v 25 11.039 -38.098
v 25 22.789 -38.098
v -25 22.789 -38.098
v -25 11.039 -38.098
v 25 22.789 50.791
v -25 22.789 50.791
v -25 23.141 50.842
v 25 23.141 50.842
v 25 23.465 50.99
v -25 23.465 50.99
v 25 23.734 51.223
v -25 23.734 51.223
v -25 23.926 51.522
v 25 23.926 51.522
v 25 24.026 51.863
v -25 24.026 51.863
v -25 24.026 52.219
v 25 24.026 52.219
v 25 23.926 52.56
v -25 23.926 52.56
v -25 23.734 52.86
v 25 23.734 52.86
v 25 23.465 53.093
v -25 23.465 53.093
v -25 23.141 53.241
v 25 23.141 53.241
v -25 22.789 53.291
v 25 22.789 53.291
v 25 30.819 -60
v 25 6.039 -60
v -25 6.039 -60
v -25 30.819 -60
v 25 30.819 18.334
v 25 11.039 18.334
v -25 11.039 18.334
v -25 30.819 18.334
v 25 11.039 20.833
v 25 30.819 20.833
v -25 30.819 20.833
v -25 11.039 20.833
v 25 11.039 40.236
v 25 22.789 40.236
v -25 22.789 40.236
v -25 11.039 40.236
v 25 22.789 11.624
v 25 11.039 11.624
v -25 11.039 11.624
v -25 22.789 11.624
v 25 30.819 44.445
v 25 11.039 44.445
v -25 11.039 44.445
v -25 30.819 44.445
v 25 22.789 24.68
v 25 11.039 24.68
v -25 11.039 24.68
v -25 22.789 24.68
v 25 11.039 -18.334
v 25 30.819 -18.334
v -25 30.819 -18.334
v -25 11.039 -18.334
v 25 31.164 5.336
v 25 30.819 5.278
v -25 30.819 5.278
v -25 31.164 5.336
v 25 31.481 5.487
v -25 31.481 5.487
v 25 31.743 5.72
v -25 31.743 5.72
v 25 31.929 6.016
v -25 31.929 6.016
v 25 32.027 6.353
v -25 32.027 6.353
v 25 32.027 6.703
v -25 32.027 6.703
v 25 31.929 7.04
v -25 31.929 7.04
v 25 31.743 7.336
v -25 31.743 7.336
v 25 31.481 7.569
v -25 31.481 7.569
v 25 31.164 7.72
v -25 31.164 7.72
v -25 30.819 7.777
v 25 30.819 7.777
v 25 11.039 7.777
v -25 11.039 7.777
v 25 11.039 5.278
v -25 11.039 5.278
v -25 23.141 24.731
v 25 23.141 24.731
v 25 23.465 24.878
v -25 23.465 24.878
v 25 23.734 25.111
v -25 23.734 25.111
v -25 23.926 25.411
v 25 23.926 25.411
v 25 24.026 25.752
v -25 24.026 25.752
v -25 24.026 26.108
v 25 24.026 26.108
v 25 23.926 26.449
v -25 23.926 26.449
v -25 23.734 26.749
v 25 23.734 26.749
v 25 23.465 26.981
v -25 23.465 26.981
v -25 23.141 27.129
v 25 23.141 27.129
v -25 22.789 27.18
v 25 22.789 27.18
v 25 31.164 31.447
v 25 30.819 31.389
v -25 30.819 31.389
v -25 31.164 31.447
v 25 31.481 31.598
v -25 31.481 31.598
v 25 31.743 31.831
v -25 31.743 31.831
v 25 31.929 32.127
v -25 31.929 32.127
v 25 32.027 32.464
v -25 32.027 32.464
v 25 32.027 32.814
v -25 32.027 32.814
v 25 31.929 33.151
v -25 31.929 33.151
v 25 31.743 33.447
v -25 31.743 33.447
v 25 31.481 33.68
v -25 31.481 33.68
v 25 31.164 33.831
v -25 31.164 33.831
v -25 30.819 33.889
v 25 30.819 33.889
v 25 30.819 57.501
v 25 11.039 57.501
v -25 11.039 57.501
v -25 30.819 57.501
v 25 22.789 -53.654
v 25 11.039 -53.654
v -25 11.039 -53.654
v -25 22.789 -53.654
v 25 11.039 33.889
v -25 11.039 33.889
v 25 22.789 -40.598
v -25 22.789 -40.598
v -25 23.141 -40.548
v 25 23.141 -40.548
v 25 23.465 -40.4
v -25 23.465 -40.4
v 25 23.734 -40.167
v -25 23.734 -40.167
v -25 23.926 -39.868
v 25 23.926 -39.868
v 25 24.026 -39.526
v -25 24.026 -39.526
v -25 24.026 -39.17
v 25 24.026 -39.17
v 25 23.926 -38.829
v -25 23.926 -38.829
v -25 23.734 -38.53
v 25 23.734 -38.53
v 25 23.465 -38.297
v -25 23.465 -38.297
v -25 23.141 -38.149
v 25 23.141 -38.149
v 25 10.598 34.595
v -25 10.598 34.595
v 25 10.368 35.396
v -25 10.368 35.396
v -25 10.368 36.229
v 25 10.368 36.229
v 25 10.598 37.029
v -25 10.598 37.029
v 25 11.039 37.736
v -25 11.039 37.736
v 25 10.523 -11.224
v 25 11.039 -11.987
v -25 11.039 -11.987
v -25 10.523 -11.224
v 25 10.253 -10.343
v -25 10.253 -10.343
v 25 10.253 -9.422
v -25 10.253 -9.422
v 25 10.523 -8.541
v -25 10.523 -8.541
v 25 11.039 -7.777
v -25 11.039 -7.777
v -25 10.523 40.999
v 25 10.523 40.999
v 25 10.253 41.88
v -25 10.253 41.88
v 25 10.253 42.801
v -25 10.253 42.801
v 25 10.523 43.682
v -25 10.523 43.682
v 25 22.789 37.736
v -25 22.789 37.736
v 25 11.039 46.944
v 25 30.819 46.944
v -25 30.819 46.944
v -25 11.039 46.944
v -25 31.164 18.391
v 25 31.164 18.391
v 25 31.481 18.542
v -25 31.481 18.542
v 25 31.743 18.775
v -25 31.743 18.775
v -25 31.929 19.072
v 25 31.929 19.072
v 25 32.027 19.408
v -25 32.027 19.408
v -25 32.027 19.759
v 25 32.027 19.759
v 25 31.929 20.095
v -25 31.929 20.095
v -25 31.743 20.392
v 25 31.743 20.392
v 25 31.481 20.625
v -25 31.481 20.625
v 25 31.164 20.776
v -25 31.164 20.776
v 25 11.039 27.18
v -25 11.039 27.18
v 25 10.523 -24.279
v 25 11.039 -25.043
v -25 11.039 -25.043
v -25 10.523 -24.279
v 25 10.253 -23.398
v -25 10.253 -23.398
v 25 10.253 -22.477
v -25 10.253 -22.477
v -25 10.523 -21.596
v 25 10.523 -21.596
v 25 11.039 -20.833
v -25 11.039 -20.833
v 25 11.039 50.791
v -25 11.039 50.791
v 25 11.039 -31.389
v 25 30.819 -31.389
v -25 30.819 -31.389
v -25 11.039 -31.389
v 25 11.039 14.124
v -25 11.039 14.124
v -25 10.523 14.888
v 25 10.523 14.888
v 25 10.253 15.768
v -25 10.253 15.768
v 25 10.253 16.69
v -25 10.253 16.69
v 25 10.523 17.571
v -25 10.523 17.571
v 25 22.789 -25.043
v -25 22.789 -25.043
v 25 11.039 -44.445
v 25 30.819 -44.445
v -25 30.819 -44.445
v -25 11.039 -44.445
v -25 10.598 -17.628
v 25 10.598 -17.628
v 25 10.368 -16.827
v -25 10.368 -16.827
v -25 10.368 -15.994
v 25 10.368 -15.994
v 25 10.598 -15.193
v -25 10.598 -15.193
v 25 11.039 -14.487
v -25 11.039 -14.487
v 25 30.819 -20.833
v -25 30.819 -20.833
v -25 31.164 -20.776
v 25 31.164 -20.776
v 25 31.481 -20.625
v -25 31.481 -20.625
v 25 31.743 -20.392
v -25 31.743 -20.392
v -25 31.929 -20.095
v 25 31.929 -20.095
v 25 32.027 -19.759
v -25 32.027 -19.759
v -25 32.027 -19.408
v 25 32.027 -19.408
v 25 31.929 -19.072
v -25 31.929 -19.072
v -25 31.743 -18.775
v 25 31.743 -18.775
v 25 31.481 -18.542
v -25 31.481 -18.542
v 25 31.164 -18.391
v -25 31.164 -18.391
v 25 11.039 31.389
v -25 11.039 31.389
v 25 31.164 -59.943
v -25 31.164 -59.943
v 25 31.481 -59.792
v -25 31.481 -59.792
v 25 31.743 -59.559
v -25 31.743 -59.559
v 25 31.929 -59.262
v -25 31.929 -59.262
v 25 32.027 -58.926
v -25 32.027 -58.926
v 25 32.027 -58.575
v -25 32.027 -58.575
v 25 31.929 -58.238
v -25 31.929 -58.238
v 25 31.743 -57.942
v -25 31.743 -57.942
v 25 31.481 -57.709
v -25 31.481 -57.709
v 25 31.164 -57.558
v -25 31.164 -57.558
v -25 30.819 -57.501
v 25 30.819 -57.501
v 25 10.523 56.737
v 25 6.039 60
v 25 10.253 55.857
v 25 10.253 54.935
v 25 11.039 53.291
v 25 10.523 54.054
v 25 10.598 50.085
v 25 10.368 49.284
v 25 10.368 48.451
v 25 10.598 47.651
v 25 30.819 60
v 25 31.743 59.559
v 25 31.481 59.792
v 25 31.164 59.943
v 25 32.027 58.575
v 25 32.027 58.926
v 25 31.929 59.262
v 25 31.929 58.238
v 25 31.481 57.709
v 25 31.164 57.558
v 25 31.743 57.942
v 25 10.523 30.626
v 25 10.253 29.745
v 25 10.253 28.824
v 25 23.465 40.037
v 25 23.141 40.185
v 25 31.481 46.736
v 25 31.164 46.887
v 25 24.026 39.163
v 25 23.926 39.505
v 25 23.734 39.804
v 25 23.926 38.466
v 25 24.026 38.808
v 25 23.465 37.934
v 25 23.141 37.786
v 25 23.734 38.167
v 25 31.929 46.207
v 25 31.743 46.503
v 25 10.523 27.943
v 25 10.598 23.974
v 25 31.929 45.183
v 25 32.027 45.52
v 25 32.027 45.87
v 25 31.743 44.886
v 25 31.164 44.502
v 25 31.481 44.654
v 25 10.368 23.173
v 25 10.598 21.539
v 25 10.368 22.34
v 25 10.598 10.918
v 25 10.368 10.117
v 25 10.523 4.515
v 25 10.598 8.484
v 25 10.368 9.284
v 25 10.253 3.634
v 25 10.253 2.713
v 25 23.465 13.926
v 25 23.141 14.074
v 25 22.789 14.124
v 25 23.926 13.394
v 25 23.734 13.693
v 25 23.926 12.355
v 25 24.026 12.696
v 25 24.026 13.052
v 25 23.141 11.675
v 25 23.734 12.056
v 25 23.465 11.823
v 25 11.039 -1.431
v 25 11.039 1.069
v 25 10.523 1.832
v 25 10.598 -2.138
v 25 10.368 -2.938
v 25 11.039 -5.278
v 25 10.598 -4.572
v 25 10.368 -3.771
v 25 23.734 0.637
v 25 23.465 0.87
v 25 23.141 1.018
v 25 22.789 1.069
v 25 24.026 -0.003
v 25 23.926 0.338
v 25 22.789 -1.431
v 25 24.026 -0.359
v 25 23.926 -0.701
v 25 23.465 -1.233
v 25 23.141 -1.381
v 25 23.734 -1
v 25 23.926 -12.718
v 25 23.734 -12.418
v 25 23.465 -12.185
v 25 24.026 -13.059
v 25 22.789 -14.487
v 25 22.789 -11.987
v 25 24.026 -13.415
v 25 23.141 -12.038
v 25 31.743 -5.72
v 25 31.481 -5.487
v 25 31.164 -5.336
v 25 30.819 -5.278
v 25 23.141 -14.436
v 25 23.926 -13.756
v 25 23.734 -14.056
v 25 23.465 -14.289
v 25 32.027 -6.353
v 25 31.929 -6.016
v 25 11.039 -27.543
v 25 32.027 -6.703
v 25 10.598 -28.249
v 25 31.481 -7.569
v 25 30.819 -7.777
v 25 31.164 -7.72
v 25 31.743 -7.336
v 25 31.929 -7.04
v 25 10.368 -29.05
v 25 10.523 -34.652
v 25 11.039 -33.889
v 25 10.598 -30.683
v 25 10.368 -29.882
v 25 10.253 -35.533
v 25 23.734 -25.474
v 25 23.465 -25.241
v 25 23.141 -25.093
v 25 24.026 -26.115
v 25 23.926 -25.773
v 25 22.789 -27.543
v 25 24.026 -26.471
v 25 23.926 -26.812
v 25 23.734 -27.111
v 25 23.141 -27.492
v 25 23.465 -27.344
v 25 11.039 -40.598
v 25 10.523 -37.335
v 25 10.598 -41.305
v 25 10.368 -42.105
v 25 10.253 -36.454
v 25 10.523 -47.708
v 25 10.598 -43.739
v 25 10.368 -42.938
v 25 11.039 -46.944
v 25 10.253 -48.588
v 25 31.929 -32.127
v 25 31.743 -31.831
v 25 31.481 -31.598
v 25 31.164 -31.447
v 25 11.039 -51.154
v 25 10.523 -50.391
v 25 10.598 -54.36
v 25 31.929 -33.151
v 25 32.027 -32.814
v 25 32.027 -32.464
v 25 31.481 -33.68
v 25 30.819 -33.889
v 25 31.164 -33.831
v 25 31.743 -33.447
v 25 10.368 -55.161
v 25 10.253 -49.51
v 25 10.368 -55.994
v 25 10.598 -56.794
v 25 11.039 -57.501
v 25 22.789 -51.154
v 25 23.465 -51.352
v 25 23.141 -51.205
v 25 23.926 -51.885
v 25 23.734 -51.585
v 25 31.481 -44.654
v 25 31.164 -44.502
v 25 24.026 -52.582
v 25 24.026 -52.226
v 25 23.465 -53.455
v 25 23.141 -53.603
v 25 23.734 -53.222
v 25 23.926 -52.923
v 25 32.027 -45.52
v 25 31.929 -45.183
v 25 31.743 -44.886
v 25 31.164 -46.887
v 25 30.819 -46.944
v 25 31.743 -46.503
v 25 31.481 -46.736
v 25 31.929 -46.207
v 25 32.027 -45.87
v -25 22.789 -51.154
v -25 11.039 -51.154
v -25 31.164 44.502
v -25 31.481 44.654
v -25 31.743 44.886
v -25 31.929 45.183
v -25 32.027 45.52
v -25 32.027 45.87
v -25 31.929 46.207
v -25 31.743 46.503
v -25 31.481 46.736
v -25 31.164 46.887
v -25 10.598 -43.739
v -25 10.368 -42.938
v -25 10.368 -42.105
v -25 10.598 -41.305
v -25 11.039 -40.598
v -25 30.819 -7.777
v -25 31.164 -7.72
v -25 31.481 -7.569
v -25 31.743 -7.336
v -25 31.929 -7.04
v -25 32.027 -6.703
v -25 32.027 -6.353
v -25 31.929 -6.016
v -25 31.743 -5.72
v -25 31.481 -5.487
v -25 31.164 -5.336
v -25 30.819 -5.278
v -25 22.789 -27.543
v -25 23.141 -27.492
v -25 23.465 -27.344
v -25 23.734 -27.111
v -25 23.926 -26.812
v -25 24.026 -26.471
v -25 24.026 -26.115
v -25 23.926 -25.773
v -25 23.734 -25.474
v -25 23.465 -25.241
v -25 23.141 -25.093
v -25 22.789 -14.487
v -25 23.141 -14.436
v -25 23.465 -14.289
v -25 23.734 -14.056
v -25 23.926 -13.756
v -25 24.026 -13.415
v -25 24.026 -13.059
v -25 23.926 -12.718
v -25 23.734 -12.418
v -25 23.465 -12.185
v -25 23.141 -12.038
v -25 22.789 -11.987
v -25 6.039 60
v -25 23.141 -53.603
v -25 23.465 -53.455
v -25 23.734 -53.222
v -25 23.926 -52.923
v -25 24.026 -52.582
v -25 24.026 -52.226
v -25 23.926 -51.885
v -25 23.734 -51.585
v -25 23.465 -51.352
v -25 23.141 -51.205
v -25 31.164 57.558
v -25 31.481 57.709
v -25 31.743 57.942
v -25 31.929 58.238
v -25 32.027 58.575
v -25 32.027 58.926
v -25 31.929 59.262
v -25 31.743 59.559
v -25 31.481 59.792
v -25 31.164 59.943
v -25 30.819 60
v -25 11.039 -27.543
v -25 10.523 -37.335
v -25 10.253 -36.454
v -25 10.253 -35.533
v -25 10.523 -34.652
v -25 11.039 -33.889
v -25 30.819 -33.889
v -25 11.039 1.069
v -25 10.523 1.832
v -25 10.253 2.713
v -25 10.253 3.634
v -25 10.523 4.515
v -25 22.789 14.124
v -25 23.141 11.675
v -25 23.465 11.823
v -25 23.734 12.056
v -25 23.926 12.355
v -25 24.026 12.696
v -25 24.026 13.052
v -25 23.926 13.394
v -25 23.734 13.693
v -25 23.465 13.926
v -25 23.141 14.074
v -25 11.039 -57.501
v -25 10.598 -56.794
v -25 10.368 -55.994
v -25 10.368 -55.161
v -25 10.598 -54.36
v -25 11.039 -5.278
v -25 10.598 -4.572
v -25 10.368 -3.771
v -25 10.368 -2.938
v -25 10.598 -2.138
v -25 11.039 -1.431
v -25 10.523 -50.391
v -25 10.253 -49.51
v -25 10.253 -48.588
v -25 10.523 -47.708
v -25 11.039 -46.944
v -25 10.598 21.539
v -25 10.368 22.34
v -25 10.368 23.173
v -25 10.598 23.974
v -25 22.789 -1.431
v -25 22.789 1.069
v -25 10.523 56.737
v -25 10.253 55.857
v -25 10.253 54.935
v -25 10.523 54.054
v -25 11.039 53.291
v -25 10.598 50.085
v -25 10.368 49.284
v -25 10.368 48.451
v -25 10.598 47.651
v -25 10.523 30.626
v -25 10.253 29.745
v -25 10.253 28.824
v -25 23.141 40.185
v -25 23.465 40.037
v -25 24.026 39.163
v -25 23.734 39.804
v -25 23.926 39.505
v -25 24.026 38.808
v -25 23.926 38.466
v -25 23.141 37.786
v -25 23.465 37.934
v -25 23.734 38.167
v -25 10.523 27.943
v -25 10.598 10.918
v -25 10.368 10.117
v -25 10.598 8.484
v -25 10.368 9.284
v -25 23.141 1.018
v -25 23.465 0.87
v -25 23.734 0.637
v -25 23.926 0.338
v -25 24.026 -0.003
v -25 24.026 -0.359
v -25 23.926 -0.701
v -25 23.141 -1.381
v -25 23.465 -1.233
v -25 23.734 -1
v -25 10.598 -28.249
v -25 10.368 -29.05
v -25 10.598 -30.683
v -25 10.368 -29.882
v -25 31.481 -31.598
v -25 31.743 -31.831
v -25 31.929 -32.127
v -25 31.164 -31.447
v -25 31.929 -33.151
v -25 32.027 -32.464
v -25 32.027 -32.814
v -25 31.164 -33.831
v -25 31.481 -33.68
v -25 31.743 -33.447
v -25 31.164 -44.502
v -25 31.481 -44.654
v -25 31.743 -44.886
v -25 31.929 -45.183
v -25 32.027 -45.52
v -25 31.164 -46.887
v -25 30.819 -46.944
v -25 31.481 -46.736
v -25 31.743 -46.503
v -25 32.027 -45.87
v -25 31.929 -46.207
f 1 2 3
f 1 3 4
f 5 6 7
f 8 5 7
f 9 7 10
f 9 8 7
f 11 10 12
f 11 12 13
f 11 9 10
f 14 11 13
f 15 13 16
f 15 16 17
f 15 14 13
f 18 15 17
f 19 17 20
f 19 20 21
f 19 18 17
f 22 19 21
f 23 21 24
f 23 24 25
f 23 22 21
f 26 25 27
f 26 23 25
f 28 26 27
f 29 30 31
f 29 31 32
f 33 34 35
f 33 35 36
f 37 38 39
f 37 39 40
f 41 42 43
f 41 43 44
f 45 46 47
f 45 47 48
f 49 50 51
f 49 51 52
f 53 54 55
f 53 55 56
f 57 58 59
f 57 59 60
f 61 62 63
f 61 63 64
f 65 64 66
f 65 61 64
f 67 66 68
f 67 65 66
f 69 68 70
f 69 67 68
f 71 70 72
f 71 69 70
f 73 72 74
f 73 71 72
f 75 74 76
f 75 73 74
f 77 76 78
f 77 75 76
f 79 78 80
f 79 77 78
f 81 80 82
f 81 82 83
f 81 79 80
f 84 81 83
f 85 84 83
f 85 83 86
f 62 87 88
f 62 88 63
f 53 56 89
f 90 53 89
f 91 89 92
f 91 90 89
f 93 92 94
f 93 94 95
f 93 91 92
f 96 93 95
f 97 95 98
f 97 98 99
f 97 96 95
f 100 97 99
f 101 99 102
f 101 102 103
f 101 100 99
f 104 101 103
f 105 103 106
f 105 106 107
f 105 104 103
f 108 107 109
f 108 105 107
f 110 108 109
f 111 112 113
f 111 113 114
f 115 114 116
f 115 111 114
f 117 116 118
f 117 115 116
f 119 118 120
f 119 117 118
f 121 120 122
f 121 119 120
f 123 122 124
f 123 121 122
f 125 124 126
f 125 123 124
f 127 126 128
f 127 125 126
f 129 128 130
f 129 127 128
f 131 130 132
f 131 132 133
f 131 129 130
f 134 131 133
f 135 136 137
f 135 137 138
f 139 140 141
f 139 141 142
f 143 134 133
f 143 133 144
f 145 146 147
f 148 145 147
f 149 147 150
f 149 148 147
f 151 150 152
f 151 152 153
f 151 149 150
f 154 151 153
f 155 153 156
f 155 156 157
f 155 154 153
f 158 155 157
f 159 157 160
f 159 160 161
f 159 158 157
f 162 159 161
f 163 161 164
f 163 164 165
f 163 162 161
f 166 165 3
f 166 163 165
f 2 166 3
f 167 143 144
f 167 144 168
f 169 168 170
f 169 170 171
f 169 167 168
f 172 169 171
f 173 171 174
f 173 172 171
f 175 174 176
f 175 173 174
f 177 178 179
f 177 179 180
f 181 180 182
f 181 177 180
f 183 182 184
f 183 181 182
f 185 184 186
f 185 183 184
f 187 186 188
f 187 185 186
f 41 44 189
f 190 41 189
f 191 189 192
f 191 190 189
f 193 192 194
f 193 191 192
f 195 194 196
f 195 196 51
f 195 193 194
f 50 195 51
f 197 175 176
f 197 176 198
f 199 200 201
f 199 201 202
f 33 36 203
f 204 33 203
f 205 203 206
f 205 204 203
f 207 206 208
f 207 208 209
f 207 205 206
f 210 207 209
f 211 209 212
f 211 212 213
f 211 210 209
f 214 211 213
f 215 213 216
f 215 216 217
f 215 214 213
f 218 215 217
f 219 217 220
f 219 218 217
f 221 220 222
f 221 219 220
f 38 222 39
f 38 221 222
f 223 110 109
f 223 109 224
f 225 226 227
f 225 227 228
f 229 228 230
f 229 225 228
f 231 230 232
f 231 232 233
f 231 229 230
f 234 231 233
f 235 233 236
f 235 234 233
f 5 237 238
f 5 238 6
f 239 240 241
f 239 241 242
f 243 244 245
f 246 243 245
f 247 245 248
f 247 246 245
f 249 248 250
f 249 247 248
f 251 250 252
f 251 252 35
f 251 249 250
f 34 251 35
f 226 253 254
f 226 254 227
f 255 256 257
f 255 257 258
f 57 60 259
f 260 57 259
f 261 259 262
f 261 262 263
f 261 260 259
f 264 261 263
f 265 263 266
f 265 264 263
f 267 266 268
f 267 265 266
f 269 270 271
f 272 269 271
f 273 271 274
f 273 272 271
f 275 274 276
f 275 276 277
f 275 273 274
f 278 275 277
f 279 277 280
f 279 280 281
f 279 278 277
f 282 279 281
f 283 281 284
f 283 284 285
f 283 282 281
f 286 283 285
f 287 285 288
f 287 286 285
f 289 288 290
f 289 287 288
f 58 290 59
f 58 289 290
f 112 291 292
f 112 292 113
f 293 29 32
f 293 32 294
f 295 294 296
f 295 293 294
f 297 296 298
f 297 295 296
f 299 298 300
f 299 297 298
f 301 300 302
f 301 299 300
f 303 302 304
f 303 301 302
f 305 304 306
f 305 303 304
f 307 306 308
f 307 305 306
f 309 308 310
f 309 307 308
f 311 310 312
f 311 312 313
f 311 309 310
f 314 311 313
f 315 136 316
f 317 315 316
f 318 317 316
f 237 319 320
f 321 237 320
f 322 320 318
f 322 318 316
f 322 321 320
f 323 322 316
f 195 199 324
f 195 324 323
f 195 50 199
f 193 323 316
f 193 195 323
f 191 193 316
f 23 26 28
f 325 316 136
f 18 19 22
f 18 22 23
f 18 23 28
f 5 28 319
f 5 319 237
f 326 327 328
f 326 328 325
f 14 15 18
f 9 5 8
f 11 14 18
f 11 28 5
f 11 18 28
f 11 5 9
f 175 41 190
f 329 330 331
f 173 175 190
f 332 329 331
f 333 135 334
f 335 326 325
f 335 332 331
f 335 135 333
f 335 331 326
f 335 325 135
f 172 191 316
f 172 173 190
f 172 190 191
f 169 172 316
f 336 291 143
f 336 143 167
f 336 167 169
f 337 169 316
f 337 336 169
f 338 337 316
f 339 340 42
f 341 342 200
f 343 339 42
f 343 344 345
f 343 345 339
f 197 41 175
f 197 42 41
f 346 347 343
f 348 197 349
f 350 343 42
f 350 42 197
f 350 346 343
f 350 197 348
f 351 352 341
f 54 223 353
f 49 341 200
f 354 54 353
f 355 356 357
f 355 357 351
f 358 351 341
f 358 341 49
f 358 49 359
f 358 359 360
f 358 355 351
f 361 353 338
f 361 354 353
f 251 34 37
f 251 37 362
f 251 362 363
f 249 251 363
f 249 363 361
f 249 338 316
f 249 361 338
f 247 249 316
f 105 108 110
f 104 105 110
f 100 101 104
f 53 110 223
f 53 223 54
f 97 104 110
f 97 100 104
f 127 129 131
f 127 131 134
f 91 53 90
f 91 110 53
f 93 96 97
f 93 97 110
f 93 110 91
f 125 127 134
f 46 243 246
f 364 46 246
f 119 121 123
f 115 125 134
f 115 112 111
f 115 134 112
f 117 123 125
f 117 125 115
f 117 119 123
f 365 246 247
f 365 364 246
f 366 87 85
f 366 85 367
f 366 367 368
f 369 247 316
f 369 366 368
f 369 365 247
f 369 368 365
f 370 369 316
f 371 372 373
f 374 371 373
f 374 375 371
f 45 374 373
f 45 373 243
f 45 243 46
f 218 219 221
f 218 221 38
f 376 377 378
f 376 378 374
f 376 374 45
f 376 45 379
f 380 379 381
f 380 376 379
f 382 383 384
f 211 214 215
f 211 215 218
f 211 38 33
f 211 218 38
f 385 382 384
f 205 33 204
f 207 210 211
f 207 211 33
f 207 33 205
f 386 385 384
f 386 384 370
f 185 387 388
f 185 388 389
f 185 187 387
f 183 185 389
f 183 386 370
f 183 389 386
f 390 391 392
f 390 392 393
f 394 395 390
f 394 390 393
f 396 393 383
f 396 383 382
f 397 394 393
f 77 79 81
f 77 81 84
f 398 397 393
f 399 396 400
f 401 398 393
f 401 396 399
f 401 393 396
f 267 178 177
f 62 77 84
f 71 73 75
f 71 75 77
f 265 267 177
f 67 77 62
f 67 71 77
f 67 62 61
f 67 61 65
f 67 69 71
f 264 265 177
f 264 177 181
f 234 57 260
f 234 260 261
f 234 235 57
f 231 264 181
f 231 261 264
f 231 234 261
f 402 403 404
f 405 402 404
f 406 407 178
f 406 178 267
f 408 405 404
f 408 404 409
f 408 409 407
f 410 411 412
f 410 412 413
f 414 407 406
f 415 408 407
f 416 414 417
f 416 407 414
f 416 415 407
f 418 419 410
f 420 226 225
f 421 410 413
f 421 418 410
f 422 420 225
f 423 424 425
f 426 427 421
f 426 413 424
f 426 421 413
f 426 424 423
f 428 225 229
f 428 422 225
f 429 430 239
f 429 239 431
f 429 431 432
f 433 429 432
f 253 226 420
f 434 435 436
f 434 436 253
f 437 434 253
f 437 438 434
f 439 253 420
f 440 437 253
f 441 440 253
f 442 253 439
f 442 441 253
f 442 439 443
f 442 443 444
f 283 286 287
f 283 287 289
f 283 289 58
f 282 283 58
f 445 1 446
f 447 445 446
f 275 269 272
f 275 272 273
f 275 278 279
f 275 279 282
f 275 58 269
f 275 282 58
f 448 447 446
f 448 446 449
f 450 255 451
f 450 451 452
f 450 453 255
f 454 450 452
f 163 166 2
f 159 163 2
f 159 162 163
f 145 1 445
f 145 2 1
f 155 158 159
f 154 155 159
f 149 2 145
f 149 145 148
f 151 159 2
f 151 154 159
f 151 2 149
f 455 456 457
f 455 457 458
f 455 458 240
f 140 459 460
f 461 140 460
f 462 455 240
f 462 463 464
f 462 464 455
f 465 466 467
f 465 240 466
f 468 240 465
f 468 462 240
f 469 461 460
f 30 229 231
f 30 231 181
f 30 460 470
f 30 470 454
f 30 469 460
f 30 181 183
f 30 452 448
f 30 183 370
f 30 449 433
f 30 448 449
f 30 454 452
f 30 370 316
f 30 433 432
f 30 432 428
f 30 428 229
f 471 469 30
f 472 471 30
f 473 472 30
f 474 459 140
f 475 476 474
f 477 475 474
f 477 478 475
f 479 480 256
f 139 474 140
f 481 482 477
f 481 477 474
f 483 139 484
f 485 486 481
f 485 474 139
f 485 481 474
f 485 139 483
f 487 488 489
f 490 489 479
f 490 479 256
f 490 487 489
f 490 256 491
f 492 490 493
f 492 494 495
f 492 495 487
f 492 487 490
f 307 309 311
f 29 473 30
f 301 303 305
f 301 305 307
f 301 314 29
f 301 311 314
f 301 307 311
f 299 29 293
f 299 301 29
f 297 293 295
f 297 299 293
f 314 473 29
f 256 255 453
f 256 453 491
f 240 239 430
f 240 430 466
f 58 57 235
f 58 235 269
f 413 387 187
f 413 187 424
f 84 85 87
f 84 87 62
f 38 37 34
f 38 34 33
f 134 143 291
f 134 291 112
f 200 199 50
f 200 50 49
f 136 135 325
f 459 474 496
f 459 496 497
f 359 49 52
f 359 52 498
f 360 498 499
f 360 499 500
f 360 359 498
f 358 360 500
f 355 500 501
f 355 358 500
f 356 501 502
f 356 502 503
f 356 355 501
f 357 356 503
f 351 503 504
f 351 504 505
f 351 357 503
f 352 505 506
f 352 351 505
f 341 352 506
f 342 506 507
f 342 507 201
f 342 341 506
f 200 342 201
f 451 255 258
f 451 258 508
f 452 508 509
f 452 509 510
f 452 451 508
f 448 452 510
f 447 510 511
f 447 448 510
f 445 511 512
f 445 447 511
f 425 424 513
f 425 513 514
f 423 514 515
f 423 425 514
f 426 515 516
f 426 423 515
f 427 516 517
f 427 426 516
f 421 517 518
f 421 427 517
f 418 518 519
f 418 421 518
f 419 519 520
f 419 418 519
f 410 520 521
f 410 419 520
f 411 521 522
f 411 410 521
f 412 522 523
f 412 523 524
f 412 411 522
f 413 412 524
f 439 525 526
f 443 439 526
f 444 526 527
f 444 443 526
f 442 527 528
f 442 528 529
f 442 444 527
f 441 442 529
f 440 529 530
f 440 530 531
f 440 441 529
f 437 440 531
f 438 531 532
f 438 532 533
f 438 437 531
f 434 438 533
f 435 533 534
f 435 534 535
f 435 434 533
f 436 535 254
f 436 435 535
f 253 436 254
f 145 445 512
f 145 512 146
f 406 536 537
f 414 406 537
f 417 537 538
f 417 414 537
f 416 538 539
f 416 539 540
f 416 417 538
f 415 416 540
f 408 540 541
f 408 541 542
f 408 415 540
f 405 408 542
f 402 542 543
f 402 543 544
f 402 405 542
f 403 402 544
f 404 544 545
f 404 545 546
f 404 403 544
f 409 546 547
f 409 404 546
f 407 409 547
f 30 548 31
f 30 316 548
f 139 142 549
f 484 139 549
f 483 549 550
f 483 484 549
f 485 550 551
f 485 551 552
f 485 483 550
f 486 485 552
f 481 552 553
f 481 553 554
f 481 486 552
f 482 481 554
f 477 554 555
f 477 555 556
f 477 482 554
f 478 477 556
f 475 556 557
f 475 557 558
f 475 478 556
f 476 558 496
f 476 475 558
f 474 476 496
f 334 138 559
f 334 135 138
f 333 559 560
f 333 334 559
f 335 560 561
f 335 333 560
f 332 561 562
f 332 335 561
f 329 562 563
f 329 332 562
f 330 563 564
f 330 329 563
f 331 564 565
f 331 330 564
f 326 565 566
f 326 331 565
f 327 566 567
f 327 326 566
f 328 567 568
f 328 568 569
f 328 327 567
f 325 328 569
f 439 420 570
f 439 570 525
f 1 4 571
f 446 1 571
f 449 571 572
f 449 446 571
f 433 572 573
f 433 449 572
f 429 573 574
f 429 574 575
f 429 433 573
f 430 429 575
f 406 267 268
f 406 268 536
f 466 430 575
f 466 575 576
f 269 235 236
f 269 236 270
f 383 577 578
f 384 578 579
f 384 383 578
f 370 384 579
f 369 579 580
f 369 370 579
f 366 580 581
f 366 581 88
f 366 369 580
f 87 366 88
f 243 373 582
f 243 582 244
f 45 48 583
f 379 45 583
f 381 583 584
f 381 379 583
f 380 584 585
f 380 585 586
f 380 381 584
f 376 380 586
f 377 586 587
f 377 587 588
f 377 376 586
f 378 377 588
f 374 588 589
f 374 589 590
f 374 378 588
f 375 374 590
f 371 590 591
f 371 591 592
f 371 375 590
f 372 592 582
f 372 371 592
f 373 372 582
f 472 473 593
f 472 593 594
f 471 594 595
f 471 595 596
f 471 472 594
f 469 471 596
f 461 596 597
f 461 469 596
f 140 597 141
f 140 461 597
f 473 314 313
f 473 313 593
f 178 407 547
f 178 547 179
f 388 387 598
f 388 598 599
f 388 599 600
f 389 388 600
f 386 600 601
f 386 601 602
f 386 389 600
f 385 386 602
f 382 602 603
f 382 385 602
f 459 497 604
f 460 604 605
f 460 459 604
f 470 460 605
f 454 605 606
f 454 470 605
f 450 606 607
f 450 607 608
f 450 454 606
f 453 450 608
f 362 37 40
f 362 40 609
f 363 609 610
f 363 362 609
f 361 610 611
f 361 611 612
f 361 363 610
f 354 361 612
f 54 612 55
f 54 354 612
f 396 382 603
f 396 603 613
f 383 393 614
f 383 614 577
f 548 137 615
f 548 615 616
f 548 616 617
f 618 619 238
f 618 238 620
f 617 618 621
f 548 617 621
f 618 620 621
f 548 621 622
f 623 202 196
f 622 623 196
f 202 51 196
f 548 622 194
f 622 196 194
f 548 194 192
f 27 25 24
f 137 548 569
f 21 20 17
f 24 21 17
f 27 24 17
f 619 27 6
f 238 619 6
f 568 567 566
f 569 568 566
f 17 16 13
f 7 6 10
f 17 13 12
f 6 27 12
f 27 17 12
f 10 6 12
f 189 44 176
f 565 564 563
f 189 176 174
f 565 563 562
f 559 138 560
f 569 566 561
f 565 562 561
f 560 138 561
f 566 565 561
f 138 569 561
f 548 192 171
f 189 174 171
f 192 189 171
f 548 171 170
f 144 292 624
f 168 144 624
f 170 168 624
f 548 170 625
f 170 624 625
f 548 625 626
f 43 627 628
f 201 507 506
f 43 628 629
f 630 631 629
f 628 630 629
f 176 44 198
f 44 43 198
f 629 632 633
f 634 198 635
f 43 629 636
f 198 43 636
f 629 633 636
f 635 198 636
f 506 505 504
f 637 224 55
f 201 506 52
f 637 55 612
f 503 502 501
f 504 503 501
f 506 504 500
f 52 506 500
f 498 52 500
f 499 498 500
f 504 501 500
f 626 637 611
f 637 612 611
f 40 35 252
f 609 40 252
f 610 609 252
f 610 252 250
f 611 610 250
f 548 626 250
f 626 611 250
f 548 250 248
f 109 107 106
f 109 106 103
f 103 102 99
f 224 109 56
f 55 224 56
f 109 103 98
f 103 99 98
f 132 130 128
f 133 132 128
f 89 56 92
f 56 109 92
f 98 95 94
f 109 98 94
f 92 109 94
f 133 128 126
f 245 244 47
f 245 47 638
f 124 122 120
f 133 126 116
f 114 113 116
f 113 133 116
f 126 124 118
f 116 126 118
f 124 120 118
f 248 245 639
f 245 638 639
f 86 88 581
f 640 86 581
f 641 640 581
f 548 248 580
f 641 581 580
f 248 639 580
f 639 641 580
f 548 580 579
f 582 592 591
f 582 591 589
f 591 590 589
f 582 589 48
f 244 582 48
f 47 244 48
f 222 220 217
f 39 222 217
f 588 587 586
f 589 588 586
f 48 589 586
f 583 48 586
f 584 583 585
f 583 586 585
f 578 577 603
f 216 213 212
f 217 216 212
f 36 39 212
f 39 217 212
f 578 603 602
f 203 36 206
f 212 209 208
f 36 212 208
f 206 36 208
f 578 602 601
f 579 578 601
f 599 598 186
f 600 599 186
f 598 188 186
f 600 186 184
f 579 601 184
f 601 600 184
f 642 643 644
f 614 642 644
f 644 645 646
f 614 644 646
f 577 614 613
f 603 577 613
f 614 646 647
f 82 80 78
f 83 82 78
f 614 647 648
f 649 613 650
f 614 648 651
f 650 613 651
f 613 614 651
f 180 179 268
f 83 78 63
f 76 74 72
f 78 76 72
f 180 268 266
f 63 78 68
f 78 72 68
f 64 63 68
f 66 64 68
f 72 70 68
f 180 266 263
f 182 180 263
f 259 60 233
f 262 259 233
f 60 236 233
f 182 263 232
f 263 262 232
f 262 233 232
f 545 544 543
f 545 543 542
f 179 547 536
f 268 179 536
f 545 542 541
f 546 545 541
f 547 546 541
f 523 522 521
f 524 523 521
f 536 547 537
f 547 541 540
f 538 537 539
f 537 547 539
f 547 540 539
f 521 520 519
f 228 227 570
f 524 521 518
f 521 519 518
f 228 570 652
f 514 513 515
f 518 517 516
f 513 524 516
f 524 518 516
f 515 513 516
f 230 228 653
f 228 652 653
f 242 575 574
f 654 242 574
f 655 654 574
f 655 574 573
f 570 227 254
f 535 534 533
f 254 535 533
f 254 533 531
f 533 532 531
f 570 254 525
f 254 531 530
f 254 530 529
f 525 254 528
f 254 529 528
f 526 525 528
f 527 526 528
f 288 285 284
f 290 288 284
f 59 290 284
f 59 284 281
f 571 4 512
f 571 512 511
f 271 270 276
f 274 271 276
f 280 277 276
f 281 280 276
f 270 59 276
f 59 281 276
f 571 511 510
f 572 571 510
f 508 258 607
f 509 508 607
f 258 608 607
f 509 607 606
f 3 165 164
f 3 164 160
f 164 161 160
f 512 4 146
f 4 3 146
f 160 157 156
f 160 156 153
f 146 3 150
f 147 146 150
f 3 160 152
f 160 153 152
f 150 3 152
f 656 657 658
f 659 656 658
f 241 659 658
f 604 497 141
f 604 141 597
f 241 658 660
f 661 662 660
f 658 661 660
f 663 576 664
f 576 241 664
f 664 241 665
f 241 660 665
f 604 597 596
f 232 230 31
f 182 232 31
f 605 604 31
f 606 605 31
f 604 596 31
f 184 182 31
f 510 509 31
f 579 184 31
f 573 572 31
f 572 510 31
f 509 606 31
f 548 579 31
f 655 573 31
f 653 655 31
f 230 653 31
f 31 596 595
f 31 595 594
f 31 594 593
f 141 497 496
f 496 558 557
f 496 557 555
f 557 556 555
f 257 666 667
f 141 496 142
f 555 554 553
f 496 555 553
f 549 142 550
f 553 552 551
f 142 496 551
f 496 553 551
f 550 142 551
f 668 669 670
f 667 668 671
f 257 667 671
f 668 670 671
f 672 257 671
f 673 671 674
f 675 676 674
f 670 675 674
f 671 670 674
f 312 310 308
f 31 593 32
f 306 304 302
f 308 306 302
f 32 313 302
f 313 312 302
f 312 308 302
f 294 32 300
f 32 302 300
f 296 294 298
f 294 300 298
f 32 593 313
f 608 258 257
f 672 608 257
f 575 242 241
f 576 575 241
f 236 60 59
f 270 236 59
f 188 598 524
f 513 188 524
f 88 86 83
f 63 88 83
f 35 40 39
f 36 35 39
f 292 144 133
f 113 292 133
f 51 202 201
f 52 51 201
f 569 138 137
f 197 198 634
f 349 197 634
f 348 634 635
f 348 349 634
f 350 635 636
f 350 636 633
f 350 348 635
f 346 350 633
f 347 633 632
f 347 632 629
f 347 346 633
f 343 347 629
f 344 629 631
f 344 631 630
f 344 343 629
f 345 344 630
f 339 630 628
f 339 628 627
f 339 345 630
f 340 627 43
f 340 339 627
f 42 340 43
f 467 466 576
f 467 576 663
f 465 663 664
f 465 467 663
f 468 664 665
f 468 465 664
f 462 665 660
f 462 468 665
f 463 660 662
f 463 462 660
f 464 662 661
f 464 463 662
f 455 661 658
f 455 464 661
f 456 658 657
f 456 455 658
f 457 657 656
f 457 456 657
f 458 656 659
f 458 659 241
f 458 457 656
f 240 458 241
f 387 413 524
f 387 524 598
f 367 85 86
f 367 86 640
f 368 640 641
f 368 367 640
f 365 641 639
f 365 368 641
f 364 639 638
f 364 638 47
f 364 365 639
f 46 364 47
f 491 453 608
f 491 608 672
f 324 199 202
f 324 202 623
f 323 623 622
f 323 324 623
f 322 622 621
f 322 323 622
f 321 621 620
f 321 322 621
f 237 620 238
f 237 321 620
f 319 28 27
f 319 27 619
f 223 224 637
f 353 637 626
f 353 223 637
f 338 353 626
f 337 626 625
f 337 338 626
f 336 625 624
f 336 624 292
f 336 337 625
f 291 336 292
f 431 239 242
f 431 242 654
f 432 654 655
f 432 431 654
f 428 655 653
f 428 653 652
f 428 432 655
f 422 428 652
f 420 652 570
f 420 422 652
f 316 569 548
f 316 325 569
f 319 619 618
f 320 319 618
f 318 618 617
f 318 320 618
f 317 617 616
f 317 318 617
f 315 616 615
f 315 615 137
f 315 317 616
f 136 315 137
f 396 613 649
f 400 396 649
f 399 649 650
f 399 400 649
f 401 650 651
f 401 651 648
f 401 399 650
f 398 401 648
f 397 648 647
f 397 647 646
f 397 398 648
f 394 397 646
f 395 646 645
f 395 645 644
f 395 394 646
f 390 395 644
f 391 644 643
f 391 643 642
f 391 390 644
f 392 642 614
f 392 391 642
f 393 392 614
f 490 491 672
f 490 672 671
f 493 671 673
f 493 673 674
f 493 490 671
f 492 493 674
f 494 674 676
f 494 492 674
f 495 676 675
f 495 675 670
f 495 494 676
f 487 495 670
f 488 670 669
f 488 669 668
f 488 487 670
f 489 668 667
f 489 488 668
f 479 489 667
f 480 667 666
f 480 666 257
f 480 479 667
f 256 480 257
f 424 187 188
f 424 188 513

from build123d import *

# Parameters (mm, degrees)
BOSS_EXTRUDE1_DEPTH = 25


with BuildPart() as part:
    # Sketch1 → Boss-Extrude1 (new, symmetric)
    with BuildSketch(Plane(origin=(0, 0, 0), x_dir=(0, 0, -1), z_dir=(1, 0, 0))):
        with BuildLine():
            Line((-60, 6.039014916), (60, 6.039014916))
            Line((60, 6.039014916), (60, 30.818764411))
            ThreePointArc((60, 30.818764411), (58.750354063, 32.039014916), (57.500708126, 30.818764411))
            Line((57.500708126, 30.818764411), (57.500708126, 11.039014916))
            ThreePointArc((57.500708126, 11.039014916), (55.57729196, 10.33874836), (53.653875793, 11.039014916))
            Line((53.653875793, 11.039014916), (53.653875793, 22.789014916))
            ThreePointArc((53.653875793, 22.789014916), (52.403875793, 24.039014916), (51.153875793, 22.789014916))
            Line((51.153875793, 22.789014916), (51.153875793, 11.039014916))
            ThreePointArc((51.153875793, 11.039014916), (49.049120778, 10.219058782), (46.944365764, 11.039014916))
            Line((46.944365764, 11.039014916), (46.944365764, 30.818764411))
            ThreePointArc((46.944365764, 30.818764411), (45.694719827, 32.039014916), (44.44507389, 30.818764411))
            Line((44.44507389, 30.818764411), (44.44507389, 11.039014916))
            ThreePointArc((44.44507389, 11.039014916), (42.521657723, 10.33874836), (40.598241557, 11.039014916))
            Line((40.598241557, 11.039014916), (40.598241557, 22.789014916))
            ThreePointArc((40.598241557, 22.789014916), (39.348241557, 24.039014916), (38.098241557, 22.789014916))
            Line((38.098241557, 22.789014916), (38.098241557, 11.039014916))
            ThreePointArc((38.098241557, 11.039014916), (35.993486542, 10.219058782), (33.888731528, 11.039014916))
            Line((33.888731528, 11.039014916), (33.888731528, 30.818764411))
            ThreePointArc((33.888731528, 30.818764411), (32.639085591, 32.039014916), (31.389439654, 30.818764411))
            Line((31.389439654, 30.818764411), (31.389439654, 11.039014916))
            ThreePointArc((31.389439654, 11.039014916), (29.466023487, 10.33874836), (27.54260732, 11.039014916))
            Line((27.54260732, 11.039014916), (27.54260732, 22.789014916))
            ThreePointArc((27.54260732, 22.789014916), (26.29260732, 24.039014916), (25.04260732, 22.789014916))
            Line((25.04260732, 22.789014916), (25.04260732, 11.039014916))
            ThreePointArc((25.04260732, 11.039014916), (22.937852306, 10.219058782), (20.833097291, 11.039014916))
            Line((20.833097291, 11.039014916), (20.833097291, 30.818764411))
            ThreePointArc((20.833097291, 30.818764411), (19.583451354, 32.039014916), (18.333805417, 30.818764411))
            Line((18.333805417, 30.818764411), (18.333805417, 11.039014916))
            ThreePointArc((18.333805417, 11.039014916), (16.410389251, 10.33874836), (14.486973084, 11.039014916))
            Line((14.486973084, 11.039014916), (14.486973084, 22.789014916))
            ThreePointArc((14.486973084, 22.789014916), (13.236973084, 24.039014916), (11.986973084, 22.789014916))
            Line((11.986973084, 22.789014916), (11.986973084, 11.039014916))
            ThreePointArc((11.986973084, 11.039014916), (9.88221807, 10.219058782), (7.777463055, 11.039014916))
            Line((7.777463055, 11.039014916), (7.777463055, 30.818764411))
            ThreePointArc((7.777463055, 30.818764411), (6.527817118, 32.039014916), (5.278171181, 30.818764411))
            Line((5.278171181, 30.818764411), (5.278171181, 11.039014916))
            ThreePointArc((5.278171181, 11.039014916), (3.354755015, 10.33874836), (1.431338848, 11.039014916))
            Line((1.431338848, 11.039014916), (1.431338848, 22.789014916))
            ThreePointArc((1.431338848, 22.789014916), (0.181338848, 24.039014916), (-1.068661152, 22.789014916))
            Line((-1.068661152, 22.789014916), (-1.068661152, 11.039014916))
            ThreePointArc((-1.068661152, 11.039014916), (-3.173416167, 10.219058782), (-5.278171181, 11.039014916))
            Line((-5.278171181, 11.039014916), (-5.278171181, 30.818764411))
            ThreePointArc((-5.278171181, 30.818764411), (-6.527817118, 32.039014916), (-7.777463055, 30.818764411))
            Line((-7.777463055, 30.818764411), (-7.777463055, 11.039014916))
            ThreePointArc((-7.777463055, 11.039014916), (-9.700879222, 10.33874836), (-11.624295388, 11.039014916))
            Line((-11.624295388, 11.039014916), (-11.624295388, 22.789014916))
            ThreePointArc((-11.624295388, 22.789014916), (-12.874295388, 24.039014916), (-14.124295388, 22.789014916))
            Line((-14.124295388, 22.789014916), (-14.124295388, 11.039014916))
            ThreePointArc((-14.124295388, 11.039014916), (-16.229050403, 10.219058782), (-18.333805417, 11.039014916))
            Line((-18.333805417, 11.039014916), (-18.333805417, 30.818764411))
            ThreePointArc((-18.333805417, 30.818764411), (-19.583451354, 32.039014916), (-20.833097291, 30.818764411))
            Line((-20.833097291, 30.818764411), (-20.833097291, 11.039014916))
            ThreePointArc((-20.833097291, 11.039014916), (-22.756513458, 10.33874836), (-24.679929625, 11.039014916))
            Line((-24.679929625, 11.039014916), (-24.679929625, 22.789014916))
            ThreePointArc((-24.679929625, 22.789014916), (-25.929929625, 24.039014916), (-27.179929625, 22.789014916))
            Line((-27.179929625, 22.789014916), (-27.179929625, 11.039014916))
            ThreePointArc((-27.179929625, 11.039014916), (-29.284684639, 10.219058782), (-31.389439654, 11.039014916))
            Line((-31.389439654, 11.039014916), (-31.389439654, 30.818764411))
            ThreePointArc((-31.389439654, 30.818764411), (-32.639085591, 32.039014916), (-33.888731528, 30.818764411))
            Line((-33.888731528, 30.818764411), (-33.888731528, 11.039014916))
            ThreePointArc((-33.888731528, 11.039014916), (-35.812147694, 10.33874836), (-37.735563861, 11.039014916))
            Line((-37.735563861, 11.039014916), (-37.735563861, 22.789014916))
            ThreePointArc((-37.735563861, 22.789014916), (-38.985563861, 24.039014916), (-40.235563861, 22.789014916))
            Line((-40.235563861, 22.789014916), (-40.235563861, 11.039014916))
            ThreePointArc((-40.235563861, 11.039014916), (-42.340318875, 10.219058782), (-44.44507389, 11.039014916))
            Line((-44.44507389, 11.039014916), (-44.44507389, 30.818764411))
            ThreePointArc((-44.44507389, 30.818764411), (-45.694719827, 32.039014916), (-46.944365764, 30.818764411))
            Line((-46.944365764, 30.818764411), (-46.944365764, 11.039014916))
            ThreePointArc((-46.944365764, 11.039014916), (-48.86778193, 10.33874836), (-50.791198097, 11.039014916))
            Line((-50.791198097, 11.039014916), (-50.791198097, 22.789014916))
            ThreePointArc((-50.791198097, 22.789014916), (-52.041198097, 24.039014916), (-53.291198097, 22.789014916))
            Line((-53.291198097, 22.789014916), (-53.291198097, 11.039014916))
            ThreePointArc((-53.291198097, 11.039014916), (-55.395953112, 10.219058782), (-57.500708126, 11.039014916))
            Line((-57.500708126, 11.039014916), (-57.500708126, 30.818764411))
            ThreePointArc((-57.500708126, 30.818764411), (-58.750354063, 32.039014916), (-60, 30.818764411))
            Line((-60, 30.818764411), (-60, 6.039014916))
        make_face()
    extrude(amount=BOSS_EXTRUDE1_DEPTH, both=True)


solid = part.part
